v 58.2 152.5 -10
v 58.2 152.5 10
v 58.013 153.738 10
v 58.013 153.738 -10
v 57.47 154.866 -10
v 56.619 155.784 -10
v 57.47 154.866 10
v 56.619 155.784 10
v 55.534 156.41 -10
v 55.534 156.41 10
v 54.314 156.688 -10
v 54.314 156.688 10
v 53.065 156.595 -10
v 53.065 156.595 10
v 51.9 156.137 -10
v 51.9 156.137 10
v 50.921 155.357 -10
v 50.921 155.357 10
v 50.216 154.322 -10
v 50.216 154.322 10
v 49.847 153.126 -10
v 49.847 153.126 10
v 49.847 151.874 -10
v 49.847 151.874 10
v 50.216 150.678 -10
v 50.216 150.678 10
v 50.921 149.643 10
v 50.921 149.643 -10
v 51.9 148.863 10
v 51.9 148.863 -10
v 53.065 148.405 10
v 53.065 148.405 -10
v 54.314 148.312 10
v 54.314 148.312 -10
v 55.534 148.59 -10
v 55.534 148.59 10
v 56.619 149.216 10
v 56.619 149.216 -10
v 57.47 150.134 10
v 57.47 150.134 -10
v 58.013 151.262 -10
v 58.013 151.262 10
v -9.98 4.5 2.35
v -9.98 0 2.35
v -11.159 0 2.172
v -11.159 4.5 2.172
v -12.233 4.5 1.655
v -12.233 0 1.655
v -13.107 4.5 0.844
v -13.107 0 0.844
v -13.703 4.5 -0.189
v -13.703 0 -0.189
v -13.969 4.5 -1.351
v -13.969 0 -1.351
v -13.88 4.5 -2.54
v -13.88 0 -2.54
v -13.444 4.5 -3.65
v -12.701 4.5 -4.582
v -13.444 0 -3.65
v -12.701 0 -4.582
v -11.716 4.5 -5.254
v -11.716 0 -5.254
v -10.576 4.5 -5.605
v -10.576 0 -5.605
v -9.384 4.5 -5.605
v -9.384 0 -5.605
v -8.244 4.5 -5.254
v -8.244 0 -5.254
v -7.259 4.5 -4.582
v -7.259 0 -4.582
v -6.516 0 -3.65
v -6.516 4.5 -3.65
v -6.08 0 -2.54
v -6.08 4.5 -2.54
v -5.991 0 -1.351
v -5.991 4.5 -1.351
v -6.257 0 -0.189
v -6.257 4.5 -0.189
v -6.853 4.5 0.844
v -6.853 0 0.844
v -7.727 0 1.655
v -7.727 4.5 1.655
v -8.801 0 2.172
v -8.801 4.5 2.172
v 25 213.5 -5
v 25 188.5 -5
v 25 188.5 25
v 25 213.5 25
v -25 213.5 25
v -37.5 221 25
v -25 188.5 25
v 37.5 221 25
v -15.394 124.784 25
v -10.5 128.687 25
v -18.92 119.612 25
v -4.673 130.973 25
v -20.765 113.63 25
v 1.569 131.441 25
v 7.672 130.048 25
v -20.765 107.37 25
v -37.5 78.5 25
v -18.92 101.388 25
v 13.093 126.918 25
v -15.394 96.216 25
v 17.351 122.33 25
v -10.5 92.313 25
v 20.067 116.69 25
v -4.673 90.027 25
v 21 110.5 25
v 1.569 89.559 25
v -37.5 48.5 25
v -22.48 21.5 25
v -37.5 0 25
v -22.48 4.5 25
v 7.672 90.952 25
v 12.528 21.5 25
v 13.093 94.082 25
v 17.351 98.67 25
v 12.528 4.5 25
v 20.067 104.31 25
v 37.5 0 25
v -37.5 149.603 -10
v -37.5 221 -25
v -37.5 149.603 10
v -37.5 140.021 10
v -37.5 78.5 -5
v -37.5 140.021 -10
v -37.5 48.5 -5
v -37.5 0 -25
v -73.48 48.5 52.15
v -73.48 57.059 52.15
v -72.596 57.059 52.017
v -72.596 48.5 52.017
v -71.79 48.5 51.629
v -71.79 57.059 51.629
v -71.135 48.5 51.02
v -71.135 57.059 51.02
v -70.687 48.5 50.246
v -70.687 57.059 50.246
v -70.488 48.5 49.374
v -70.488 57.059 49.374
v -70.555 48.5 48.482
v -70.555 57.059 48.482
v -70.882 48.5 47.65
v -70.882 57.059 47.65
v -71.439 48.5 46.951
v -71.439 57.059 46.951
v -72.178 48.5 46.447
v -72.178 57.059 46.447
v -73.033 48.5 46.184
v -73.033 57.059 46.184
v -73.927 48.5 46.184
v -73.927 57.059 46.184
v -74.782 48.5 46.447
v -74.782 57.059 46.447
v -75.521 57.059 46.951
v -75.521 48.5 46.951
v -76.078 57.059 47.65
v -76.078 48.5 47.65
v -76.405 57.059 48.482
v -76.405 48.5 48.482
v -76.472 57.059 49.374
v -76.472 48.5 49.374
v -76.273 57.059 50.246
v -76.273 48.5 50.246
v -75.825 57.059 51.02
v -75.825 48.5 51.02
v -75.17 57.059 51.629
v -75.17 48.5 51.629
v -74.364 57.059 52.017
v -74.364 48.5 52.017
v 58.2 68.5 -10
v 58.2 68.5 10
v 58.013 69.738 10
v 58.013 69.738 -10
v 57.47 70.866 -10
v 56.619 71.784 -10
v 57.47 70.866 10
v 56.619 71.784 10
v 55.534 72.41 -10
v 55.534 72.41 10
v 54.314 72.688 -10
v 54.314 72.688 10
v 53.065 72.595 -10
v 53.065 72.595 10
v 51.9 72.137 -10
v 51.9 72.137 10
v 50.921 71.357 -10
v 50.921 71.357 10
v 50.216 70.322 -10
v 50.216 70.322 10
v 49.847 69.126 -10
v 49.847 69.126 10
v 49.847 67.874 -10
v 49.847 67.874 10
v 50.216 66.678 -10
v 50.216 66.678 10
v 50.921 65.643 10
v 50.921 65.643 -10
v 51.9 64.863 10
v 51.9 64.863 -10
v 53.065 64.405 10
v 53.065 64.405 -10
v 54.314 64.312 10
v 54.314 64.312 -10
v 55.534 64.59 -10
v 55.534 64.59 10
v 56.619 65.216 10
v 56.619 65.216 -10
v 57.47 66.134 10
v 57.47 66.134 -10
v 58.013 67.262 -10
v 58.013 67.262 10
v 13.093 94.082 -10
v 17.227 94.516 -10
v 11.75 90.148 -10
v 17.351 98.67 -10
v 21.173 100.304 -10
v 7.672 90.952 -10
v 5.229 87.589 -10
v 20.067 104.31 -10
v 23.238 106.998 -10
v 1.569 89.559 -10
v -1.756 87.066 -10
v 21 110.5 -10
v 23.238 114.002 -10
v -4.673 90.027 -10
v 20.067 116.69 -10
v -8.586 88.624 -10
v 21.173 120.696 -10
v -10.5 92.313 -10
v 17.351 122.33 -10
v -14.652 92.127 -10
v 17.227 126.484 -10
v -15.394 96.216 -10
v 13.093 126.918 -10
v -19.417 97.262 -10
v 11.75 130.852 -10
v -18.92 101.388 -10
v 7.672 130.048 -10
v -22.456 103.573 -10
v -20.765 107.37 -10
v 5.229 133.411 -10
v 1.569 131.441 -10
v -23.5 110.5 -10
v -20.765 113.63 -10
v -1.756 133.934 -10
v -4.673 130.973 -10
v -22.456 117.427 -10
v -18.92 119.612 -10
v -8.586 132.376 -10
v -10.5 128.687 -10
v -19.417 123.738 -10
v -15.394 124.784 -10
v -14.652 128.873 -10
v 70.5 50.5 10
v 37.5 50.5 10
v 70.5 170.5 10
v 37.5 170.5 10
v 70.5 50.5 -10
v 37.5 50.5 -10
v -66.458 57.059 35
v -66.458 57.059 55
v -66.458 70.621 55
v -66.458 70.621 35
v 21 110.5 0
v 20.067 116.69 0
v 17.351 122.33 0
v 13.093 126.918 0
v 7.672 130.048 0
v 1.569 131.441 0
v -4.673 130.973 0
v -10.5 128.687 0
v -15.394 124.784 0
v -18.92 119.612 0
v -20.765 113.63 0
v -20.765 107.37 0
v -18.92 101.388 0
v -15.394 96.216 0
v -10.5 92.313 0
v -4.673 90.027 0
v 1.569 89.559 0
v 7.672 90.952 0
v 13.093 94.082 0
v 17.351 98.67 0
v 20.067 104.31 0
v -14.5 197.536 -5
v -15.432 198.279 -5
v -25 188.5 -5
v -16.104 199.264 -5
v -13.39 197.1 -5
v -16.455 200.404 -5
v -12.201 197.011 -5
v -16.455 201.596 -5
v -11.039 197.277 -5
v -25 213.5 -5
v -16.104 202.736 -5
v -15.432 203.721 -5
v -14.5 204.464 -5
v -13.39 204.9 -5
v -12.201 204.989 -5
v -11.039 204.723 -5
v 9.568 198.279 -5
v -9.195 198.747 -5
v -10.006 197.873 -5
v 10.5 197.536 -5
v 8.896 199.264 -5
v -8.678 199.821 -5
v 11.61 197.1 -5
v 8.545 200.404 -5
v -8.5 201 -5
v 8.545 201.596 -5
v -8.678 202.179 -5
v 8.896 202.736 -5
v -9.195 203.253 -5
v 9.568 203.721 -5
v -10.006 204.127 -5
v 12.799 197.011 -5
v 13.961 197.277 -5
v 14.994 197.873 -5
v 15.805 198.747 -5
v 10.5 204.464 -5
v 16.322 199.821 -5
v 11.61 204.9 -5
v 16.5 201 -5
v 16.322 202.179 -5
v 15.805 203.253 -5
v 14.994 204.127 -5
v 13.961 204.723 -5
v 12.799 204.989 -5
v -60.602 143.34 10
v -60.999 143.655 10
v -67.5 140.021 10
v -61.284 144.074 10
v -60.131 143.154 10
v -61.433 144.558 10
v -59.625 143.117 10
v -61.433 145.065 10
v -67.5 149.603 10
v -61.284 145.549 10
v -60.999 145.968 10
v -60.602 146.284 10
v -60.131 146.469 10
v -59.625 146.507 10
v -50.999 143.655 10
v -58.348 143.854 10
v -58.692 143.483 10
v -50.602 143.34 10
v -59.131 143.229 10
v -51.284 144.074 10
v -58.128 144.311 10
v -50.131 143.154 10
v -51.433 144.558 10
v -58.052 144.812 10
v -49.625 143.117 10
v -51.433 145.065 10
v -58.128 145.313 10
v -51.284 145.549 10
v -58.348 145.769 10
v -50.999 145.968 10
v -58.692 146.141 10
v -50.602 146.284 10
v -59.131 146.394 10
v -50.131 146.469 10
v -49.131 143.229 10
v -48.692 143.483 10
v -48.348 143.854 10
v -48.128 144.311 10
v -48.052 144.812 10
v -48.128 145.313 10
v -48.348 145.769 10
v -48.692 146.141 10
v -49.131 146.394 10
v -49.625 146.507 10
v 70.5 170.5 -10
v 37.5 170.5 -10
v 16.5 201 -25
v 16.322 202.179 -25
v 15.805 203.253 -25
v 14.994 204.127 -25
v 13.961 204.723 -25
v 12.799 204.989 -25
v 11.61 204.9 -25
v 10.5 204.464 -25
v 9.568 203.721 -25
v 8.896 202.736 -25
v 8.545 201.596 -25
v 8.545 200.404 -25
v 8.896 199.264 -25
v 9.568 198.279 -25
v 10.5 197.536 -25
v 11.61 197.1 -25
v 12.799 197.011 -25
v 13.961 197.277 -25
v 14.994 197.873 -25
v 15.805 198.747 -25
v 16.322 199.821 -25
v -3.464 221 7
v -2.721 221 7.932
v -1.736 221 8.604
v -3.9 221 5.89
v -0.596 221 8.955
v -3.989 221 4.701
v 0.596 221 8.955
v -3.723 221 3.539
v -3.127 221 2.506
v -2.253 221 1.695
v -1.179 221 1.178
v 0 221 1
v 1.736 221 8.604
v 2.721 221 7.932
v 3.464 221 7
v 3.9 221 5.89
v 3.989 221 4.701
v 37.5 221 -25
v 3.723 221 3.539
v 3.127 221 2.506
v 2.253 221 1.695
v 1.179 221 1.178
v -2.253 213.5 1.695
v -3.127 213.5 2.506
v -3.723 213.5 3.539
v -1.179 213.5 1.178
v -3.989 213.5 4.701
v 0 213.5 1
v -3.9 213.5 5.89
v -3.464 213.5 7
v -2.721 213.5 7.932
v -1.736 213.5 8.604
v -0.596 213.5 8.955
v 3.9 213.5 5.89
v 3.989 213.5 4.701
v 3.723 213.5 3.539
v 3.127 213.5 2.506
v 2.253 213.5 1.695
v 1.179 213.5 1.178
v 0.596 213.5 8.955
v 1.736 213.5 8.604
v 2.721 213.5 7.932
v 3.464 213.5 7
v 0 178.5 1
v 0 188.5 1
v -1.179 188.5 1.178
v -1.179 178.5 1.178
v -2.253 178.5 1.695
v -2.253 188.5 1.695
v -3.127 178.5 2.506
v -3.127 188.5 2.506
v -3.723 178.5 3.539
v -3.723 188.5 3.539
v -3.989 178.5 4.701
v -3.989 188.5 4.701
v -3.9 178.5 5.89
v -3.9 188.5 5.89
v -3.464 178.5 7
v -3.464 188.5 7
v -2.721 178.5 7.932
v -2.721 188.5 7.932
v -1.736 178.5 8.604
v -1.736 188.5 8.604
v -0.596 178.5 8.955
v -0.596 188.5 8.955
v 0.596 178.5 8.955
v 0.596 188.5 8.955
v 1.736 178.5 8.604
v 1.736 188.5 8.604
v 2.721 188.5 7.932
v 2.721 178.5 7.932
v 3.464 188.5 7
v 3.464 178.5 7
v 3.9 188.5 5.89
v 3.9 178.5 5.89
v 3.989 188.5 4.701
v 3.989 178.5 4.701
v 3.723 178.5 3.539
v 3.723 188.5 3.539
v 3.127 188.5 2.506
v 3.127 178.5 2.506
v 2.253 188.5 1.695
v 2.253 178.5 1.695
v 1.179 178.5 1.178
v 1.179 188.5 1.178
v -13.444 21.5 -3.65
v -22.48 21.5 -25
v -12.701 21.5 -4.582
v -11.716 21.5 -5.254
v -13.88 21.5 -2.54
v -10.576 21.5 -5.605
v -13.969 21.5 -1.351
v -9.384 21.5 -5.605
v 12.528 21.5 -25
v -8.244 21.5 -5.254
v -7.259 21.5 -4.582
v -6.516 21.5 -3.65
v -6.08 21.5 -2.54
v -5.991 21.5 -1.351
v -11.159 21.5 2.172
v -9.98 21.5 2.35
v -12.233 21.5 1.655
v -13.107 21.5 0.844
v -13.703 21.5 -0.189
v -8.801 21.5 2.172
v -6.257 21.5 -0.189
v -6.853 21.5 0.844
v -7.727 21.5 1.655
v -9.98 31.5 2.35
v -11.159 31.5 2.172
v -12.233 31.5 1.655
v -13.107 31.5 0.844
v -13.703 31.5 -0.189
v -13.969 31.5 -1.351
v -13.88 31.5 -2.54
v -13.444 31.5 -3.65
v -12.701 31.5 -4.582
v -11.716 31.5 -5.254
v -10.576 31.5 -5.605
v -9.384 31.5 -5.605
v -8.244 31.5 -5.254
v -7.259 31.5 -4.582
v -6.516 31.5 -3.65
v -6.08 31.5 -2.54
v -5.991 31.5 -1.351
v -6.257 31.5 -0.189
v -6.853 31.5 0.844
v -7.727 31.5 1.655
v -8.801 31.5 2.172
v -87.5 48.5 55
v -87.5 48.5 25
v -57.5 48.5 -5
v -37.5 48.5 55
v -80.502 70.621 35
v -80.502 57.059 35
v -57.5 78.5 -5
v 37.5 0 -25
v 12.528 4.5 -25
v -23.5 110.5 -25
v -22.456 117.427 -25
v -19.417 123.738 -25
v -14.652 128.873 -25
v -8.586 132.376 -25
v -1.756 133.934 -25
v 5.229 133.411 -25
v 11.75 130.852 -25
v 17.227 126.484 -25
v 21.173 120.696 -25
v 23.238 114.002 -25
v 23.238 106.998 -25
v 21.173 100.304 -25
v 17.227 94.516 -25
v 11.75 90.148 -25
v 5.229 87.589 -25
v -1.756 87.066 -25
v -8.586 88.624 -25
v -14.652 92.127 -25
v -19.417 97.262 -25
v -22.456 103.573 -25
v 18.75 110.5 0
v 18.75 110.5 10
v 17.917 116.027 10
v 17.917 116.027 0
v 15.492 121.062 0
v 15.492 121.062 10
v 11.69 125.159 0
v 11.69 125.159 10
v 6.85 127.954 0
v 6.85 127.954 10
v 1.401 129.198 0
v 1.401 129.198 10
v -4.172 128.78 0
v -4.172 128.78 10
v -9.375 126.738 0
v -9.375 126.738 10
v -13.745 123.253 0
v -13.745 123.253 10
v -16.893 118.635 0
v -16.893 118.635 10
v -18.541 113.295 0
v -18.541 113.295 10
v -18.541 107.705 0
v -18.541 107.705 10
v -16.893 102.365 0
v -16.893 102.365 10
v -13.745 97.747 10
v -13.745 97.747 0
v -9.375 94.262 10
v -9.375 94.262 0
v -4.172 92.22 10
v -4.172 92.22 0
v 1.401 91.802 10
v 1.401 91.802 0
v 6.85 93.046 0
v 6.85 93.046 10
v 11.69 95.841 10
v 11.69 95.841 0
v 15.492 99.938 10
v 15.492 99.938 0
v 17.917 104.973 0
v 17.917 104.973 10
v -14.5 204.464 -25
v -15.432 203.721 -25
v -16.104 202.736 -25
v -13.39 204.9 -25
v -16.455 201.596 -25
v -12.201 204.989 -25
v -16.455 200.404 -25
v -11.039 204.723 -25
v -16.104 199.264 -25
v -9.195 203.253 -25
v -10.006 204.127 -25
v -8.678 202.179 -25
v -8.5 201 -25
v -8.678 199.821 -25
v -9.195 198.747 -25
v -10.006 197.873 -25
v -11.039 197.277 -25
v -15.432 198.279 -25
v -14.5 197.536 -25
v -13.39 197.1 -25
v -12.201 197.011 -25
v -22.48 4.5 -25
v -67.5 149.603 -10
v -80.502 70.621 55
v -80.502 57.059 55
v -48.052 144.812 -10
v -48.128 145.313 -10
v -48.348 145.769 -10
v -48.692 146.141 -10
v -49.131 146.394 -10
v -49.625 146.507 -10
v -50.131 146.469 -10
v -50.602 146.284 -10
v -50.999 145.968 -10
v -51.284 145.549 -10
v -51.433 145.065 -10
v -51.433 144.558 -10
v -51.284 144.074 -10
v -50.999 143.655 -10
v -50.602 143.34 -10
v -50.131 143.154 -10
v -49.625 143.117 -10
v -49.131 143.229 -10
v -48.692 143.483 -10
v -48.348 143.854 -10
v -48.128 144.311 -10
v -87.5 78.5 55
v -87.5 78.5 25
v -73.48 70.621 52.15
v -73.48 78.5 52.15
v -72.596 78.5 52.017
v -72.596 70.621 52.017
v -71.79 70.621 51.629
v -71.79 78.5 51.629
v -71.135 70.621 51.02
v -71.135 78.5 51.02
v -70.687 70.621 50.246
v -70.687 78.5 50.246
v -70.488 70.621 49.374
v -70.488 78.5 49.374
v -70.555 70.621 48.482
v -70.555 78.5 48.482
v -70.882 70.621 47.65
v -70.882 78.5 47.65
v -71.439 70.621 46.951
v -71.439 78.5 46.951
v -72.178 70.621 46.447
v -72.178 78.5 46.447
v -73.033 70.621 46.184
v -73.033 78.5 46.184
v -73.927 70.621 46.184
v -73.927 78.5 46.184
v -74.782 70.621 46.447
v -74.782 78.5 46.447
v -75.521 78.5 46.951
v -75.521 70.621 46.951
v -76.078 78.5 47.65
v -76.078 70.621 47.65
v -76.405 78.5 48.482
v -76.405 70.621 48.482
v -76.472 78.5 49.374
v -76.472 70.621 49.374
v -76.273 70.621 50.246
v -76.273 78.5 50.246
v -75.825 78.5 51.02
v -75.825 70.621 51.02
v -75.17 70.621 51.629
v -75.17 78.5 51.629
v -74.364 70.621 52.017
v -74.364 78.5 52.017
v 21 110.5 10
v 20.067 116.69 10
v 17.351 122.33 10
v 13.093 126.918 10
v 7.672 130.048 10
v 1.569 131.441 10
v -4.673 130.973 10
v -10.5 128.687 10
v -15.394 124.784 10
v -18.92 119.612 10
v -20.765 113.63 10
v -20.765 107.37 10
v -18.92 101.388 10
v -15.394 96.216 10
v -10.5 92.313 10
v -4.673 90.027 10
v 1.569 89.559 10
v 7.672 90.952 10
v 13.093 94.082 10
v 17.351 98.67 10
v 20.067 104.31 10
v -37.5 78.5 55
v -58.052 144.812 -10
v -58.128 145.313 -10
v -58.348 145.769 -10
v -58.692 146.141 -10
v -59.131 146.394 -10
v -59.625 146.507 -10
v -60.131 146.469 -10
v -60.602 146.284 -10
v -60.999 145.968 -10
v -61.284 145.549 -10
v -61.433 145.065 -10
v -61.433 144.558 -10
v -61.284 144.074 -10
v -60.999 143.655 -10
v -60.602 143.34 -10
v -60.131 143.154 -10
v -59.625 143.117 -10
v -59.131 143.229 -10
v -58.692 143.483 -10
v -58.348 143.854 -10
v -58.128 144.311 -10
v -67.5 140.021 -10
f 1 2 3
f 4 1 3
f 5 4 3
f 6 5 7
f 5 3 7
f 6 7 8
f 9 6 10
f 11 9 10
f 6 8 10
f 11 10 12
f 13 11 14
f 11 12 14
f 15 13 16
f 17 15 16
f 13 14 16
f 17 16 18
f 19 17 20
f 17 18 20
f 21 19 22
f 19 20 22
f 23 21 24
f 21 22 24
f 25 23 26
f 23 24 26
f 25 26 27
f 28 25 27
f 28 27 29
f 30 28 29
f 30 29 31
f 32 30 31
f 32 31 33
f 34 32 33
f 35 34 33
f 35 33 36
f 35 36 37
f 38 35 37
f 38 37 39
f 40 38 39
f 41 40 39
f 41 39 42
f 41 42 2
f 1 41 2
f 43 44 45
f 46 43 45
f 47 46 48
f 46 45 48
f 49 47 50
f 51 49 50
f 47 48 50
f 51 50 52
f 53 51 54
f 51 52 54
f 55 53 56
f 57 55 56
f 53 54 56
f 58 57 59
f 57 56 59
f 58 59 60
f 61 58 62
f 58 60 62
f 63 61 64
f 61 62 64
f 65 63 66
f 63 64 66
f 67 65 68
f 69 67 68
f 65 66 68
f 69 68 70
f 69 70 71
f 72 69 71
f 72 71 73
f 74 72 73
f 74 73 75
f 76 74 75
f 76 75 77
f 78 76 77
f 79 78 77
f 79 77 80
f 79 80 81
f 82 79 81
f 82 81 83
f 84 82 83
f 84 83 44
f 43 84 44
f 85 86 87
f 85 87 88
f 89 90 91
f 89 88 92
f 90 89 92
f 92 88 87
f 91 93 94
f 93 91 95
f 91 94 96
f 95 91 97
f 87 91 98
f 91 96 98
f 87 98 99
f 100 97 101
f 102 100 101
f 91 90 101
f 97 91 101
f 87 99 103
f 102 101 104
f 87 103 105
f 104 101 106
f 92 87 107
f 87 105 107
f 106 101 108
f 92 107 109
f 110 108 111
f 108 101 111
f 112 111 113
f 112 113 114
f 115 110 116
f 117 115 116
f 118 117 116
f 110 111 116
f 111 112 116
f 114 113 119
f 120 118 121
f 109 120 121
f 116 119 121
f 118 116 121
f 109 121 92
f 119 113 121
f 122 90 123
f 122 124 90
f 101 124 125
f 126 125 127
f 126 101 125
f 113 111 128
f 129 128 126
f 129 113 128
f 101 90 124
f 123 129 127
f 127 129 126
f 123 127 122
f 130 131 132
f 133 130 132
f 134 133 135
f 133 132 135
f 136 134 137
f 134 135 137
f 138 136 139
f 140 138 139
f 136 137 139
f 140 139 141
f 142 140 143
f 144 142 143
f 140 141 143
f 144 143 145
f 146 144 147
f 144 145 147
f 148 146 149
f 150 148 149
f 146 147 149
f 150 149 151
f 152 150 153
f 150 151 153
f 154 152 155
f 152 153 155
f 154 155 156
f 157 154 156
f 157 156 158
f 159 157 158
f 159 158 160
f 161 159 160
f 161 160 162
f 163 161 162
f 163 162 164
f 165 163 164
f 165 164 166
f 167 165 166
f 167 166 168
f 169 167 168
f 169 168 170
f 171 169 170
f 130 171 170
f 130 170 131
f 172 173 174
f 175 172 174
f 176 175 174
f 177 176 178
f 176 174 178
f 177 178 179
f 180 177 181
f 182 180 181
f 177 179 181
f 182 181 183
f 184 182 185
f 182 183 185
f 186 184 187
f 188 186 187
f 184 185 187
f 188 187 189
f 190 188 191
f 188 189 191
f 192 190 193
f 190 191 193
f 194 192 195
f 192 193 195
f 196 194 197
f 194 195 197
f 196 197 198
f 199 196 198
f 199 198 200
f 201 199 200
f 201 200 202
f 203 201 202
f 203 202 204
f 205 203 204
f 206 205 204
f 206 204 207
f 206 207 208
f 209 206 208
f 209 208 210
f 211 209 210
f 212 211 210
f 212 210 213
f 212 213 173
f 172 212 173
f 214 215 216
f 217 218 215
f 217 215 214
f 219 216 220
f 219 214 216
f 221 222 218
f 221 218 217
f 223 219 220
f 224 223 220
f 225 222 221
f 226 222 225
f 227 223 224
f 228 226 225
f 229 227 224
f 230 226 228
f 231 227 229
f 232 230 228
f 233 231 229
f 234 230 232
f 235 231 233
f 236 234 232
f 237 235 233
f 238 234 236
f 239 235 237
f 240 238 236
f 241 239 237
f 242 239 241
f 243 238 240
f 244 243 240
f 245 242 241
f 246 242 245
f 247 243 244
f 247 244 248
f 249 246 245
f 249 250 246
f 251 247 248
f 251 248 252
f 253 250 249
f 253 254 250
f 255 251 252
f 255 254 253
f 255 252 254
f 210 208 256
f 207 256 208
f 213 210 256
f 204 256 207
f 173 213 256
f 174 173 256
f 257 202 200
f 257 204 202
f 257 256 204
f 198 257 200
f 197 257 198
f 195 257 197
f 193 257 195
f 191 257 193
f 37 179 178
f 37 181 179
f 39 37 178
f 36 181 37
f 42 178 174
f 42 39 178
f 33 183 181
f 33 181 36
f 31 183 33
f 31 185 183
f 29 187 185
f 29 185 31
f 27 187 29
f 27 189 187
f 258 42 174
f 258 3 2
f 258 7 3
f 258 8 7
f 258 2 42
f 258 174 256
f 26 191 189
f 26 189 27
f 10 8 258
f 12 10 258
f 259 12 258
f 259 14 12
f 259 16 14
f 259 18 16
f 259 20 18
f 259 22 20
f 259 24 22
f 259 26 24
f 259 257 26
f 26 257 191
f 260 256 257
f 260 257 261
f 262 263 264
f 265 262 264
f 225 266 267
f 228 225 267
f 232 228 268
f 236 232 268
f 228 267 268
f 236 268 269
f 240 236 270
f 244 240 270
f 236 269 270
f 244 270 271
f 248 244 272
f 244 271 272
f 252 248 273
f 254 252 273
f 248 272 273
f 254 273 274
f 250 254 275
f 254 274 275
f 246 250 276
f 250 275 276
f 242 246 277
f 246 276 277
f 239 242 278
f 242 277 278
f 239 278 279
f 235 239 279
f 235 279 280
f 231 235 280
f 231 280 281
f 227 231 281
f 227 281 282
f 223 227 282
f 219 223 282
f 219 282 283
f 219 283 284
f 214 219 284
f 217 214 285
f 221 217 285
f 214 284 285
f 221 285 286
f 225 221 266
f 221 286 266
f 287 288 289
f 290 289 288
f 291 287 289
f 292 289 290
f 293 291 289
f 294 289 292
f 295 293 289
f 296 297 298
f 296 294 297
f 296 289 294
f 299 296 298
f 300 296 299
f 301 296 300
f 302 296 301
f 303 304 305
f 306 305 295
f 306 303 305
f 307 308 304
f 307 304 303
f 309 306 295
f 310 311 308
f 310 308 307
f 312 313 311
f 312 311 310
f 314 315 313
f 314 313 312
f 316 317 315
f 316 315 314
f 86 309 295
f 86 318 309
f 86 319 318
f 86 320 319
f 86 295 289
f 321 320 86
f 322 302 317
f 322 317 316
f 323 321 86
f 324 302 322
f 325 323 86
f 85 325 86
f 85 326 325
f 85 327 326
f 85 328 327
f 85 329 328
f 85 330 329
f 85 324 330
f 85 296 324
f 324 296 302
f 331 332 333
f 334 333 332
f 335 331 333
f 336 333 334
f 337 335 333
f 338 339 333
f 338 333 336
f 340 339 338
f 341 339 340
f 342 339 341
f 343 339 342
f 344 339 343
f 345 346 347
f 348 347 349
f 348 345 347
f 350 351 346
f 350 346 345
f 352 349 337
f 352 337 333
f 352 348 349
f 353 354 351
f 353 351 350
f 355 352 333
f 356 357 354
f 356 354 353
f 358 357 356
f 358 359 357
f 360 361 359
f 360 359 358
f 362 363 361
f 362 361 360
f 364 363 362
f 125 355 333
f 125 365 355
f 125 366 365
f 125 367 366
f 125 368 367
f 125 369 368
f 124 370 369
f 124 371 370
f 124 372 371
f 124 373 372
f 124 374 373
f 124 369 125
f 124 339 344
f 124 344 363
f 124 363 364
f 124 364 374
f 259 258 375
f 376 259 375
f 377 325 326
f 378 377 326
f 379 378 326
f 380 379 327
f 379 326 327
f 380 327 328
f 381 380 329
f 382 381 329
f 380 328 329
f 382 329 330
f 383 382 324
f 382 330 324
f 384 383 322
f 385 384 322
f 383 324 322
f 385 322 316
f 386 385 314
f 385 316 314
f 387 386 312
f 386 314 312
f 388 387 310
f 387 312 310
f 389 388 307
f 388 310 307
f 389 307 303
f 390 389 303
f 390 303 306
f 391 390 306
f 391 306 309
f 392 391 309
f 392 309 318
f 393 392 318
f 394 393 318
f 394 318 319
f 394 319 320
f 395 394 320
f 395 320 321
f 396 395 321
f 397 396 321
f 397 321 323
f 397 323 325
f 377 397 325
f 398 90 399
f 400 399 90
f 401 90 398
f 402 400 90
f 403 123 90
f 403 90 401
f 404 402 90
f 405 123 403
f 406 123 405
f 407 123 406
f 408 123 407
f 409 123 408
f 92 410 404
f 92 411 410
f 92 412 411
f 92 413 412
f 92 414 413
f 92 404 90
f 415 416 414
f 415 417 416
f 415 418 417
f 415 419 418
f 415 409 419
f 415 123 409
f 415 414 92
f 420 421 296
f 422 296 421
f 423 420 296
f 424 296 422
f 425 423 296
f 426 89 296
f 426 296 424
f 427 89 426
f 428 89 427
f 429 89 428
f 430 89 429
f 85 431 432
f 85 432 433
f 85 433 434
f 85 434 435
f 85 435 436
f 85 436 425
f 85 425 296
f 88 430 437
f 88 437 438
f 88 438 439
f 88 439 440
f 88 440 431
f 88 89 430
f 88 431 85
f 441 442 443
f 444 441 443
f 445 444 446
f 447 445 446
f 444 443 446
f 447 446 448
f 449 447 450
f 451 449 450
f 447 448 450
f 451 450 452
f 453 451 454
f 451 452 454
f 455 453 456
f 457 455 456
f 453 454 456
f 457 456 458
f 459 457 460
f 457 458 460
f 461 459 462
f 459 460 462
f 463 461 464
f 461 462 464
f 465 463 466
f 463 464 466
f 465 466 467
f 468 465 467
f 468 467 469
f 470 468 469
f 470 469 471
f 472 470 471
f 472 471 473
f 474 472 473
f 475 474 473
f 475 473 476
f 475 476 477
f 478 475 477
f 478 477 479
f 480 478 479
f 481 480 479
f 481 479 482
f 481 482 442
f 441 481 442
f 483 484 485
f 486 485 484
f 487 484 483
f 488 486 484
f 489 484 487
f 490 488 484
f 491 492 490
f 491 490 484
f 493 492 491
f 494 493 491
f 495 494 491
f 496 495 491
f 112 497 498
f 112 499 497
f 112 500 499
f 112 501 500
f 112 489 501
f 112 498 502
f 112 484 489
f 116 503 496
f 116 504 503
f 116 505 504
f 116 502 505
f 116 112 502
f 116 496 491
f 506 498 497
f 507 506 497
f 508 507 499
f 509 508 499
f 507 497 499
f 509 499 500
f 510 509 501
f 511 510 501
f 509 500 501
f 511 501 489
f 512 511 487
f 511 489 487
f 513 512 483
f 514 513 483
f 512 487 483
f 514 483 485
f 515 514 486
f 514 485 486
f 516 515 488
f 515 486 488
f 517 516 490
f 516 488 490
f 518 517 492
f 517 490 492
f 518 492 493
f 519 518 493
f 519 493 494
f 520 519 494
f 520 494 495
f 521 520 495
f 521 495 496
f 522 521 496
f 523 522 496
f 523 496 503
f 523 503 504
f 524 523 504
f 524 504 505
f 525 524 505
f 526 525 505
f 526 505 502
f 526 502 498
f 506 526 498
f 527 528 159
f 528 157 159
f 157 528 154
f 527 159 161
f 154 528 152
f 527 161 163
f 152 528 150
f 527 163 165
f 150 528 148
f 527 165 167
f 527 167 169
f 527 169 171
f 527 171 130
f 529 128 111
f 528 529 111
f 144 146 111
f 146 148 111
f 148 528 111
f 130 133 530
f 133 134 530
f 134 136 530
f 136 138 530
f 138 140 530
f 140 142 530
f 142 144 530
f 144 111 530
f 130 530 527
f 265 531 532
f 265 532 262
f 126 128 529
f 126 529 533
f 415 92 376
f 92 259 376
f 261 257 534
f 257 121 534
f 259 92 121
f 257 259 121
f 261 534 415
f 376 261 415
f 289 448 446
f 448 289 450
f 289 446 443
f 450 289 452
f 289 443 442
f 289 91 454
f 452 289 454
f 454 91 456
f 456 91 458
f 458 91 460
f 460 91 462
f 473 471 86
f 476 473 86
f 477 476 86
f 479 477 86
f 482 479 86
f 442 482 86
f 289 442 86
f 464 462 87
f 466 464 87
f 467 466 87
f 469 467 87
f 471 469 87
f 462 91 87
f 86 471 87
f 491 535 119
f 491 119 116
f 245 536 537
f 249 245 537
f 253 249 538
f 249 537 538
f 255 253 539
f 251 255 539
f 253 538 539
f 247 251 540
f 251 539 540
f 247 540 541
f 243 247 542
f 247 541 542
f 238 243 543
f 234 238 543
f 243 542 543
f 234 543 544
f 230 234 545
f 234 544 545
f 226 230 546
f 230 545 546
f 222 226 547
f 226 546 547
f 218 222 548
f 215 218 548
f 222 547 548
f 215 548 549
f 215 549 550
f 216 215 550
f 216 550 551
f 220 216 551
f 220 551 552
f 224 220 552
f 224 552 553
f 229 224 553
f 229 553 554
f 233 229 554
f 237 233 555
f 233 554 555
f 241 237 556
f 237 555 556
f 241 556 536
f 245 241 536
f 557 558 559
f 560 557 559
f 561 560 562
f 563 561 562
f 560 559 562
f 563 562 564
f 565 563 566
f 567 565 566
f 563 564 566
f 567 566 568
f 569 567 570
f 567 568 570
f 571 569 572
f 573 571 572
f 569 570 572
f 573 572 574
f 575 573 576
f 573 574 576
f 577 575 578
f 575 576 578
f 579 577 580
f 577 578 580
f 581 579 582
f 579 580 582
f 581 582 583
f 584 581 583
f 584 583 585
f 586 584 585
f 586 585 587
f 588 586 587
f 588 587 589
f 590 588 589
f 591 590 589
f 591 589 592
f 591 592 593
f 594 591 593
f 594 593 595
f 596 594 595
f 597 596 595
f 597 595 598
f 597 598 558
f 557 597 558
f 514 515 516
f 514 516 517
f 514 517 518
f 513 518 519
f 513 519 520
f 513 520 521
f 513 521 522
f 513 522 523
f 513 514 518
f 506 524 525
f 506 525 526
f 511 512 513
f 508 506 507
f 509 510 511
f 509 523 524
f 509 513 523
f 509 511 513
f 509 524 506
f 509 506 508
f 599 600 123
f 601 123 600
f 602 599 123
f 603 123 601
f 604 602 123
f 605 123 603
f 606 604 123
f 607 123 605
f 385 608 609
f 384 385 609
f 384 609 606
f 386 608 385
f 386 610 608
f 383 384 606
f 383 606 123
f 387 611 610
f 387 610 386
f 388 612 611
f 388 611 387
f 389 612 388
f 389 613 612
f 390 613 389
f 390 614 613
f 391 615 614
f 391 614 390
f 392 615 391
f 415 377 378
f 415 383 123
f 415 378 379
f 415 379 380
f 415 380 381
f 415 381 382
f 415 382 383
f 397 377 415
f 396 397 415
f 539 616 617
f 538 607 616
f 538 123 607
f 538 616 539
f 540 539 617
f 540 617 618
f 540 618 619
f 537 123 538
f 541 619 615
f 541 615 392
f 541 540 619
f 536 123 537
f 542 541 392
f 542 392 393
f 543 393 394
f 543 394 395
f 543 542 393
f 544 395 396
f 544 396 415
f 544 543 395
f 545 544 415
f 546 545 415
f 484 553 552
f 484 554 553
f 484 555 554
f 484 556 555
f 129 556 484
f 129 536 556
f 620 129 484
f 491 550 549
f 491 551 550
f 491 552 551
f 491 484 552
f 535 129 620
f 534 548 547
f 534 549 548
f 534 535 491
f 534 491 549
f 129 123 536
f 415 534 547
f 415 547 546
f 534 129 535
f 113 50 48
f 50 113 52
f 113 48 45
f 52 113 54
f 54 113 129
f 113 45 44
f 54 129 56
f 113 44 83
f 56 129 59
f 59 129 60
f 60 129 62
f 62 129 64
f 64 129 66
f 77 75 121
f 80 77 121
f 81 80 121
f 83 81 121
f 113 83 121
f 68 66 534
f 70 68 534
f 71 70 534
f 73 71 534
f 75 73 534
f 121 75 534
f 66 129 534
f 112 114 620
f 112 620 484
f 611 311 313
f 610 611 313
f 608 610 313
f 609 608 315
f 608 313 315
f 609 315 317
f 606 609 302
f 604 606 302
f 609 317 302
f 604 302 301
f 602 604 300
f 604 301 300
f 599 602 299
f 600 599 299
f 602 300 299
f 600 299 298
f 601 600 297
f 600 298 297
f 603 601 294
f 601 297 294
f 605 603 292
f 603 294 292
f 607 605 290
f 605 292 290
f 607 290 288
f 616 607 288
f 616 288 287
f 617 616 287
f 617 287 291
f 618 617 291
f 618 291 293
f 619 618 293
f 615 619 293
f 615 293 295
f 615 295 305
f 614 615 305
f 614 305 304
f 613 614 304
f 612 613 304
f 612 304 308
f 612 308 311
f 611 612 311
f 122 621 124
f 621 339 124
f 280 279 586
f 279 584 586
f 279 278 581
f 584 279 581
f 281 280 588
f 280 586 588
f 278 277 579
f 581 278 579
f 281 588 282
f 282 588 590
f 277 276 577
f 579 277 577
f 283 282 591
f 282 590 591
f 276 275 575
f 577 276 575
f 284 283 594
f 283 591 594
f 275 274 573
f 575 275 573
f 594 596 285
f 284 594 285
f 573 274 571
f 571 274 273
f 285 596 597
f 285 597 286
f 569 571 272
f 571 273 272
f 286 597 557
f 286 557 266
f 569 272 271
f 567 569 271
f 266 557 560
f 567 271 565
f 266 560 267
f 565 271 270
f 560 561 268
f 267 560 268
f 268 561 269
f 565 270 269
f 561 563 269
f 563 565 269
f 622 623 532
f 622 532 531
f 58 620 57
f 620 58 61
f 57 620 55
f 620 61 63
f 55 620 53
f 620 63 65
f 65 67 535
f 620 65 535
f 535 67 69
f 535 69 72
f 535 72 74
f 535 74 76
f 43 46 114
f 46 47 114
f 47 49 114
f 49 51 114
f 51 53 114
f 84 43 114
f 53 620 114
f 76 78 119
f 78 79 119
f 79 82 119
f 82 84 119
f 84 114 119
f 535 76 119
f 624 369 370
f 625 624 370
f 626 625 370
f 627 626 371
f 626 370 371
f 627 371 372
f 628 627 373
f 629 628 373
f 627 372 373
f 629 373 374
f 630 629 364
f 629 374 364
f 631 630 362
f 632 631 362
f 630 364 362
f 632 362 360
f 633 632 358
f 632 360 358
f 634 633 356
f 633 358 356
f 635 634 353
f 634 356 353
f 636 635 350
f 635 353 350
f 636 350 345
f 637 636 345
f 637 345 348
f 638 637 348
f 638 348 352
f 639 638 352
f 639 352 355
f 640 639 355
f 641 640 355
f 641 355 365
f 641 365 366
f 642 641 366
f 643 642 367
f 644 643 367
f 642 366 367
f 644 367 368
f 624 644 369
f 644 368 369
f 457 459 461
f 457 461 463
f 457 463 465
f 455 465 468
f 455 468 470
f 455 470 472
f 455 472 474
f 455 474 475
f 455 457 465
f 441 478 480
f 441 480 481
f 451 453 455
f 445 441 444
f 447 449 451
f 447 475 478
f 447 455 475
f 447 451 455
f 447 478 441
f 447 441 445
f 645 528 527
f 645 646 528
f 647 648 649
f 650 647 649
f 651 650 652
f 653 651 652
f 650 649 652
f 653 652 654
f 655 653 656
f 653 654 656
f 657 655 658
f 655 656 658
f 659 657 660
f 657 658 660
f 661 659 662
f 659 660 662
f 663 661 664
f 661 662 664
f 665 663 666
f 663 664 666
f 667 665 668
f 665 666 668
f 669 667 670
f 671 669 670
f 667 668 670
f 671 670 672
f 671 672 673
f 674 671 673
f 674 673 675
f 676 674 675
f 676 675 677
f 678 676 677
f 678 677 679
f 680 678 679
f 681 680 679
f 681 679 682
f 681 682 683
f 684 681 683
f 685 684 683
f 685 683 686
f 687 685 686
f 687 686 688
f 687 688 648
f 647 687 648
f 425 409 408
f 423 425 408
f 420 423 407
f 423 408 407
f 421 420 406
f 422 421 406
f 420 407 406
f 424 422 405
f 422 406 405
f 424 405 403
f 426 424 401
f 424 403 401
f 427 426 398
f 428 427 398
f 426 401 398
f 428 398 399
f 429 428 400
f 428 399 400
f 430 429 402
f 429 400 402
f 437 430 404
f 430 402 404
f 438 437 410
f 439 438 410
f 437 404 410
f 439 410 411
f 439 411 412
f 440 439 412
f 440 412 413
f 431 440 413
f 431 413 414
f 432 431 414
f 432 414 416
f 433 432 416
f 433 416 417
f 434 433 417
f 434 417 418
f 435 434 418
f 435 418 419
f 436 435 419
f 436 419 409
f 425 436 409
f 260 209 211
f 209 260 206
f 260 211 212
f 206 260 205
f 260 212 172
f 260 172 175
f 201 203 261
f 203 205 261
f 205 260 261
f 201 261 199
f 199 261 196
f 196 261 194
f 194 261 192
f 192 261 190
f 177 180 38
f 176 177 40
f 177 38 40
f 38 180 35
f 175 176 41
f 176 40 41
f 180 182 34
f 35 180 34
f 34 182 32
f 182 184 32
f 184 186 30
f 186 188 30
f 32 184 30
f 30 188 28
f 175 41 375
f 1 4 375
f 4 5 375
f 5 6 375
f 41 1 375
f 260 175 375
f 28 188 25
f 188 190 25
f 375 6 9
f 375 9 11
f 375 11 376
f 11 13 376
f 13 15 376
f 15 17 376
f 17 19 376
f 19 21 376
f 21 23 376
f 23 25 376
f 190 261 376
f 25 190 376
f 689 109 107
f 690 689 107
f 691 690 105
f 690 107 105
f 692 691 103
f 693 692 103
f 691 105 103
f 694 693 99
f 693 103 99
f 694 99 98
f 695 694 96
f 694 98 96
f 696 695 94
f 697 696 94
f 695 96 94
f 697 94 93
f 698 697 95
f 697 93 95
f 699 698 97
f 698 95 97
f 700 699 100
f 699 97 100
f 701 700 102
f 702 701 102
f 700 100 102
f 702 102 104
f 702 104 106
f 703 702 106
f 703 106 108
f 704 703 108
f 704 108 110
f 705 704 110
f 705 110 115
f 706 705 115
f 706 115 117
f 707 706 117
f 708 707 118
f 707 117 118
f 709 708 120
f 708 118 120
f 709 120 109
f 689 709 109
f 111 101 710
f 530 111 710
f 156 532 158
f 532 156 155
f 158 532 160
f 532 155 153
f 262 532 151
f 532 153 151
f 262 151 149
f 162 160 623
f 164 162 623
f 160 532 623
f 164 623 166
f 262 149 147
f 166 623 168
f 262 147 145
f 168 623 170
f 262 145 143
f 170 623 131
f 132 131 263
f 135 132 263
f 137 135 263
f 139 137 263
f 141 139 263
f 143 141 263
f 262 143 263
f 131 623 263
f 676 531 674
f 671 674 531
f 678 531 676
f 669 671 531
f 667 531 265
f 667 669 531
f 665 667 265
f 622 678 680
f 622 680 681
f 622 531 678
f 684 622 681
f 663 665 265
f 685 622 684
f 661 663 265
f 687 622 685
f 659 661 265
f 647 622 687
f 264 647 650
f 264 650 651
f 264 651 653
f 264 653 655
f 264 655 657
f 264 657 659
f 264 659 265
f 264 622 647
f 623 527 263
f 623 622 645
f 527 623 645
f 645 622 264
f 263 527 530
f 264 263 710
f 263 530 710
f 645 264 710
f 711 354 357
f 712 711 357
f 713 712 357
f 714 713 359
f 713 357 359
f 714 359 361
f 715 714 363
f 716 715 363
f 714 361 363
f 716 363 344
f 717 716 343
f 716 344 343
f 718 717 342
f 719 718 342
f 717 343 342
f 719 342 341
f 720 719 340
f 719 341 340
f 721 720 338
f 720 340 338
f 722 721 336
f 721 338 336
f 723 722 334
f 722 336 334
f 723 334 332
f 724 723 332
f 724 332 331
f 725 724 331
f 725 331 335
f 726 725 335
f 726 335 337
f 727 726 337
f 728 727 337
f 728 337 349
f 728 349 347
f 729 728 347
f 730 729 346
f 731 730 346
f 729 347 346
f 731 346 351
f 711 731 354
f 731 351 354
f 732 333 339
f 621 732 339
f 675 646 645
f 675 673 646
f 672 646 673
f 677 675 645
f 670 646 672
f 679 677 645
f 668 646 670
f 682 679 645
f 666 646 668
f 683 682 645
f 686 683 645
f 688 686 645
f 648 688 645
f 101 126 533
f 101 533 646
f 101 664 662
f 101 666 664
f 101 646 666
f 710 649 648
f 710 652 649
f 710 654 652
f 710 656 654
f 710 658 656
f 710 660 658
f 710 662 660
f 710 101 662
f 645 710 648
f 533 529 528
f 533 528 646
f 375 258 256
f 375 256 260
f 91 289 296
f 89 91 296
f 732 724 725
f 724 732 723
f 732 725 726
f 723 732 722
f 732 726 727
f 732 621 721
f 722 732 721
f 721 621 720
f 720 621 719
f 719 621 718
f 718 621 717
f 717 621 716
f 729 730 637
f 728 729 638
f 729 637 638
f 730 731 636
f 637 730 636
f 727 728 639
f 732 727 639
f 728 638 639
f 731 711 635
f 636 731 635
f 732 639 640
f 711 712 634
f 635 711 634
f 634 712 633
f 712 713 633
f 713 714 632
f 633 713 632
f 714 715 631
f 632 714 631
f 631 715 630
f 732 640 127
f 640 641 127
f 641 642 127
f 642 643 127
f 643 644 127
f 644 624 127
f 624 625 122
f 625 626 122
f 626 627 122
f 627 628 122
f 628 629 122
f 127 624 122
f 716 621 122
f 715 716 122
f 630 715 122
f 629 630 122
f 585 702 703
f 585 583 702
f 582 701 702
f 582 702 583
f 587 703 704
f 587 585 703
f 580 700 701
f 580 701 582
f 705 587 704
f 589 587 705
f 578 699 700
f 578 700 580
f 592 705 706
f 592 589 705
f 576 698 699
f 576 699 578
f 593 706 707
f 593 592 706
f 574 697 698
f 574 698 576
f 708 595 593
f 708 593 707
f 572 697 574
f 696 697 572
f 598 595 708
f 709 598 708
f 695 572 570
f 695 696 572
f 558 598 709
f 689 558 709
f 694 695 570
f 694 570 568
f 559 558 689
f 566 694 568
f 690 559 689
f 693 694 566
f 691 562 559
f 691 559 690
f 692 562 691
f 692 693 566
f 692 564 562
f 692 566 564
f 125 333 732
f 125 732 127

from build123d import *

# Parameters (mm, degrees)
SKETCH1_W                         = 75
SKETCH1_H                         = 50
BE_MAIN_UPRIGHT_BODY_DEPTH        = 221
SKETCH4_R                         = 18.75
CE_THROUGH_HOLE_DEPTH             = 230.667694724
SKETCH2_R                         = 21
CE_INNER_BEARING_DEPTH            = 15
SKETCH3_R                         = 23.5
CE_OUTER_BEARING_DEPTH            = 15
SKETCH7_W                         = 20
SKETCH7_H                         = 120
BE_CALIPER_MOUNT_DEPTH            = 33
SKETCH21_W                        = 30
SKETCH21_H                        = 9.582052631
BE_TEMP_SENSOR_MOUNT_V2_DEPTH     = 10
SKETCH9_W                         = 60
SKETCH9_H                         = 30
BE_TIE_ROD_MOUNT_DEPTH            = 50
SKETCH10_R                        = 4.2
CE_CALIPER_HOLES_DEPTH            = 242.91372429
SKETCH12_R                        = 4
CE_TOP_CLEVIS_HOLES_DEPTH         = 243.893495178
SKETCH33_W                        = 50
SKETCH33_H                        = 25
CE_SIMPLE_TOP_CLEVIS_SPACE_DEPTH  = 30
SKETCH34_R                        = 4
CUT_EXTRUDE12_DEPTH               = 42.5
SKETCH14_W                        = 25
SKETCH14_H                        = 12
CE_BOTTOM_CLEVIS_SPACE_DEPTH      = 243.893495178
SKETCH15_W                        = 25
SKETCH15_H                        = 5
CE_EXPAND_BOTTOM_CLEVIS_DEPTH     = 243.893495178
CE_WIDEN_BOTTOM_CLEVIS_DEPTH      = 240.74121548
CE_WIDEN_BOTTOM_CLEVIS_DEPTH_BACK = 240.74121548
SKETCH16_W                        = 10.007554032
SKETCH16_H                        = 17
CHAMFER1_SIZE                     = 30
SKETCH18_W                        = 14.04398123
SKETCH18_H                        = 13.562779604
CUT_EXTRUDE1_DEPTH                = 20
SKETCH19_R                        = 3
CUT_EXTRUDE2_DEPTH                = 177.032667423
SKETCH22_R                        = 1.7
CUT_EXTRUDE4_DEPTH                = 20
SKETCH31_R                        = 4
CUT_EXTRUDE9_DEPTH                = 31.5
SKETCH35_R                        = 21
CUT_EXTRUDE13_DEPTH               = 10


with BuildPart() as part:
    # Sketch1 → BE - main upright body (new body)
    with BuildSketch(Plane(origin=(0, 0, 0), x_dir=(1, 0, 0), z_dir=(0, 1, 0))):
        Rectangle(SKETCH1_W, SKETCH1_H)
    extrude(amount=BE_MAIN_UPRIGHT_BODY_DEPTH)

    # Sketch4 → CE - Through hole (cut, through all)
    with BuildSketch(Plane.XY.offset(25)):
        with Locations((0, 110.5)):
            Circle(SKETCH4_R)
    extrude(amount=-CE_THROUGH_HOLE_DEPTH, mode=Mode.SUBTRACT)

    # Sketch2 → CE - Inner bearing (cut)
    with BuildSketch(Plane.XY.offset(25)):
        with Locations((0, 110.5)):
            Circle(SKETCH2_R)
    extrude(amount=-CE_INNER_BEARING_DEPTH, mode=Mode.SUBTRACT)

    # Sketch3 → CE - Outer bearing (cut)
    with BuildSketch(Plane(origin=(0, 0, -25), x_dir=(-1, 0, 0), z_dir=(0, 0, -1))):
        with Locations((0, 110.5)):
            Circle(SKETCH3_R)
    extrude(amount=-CE_OUTER_BEARING_DEPTH, mode=Mode.SUBTRACT)

    # Sketch7 → BE - caliper mount (add)
    with BuildSketch(Plane(origin=(37.5, 0, 0), x_dir=(0, 0, -1), z_dir=(1, 0, 0))):
        with Locations((0, 110.5)):
            Rectangle(SKETCH7_W, SKETCH7_H)
    extrude(amount=BE_CALIPER_MOUNT_DEPTH)

    # Sketch21 → BE - temp sensor mount v2 (add, symmetric)
    with BuildSketch(Plane.XY):
        with Locations((-52.5, 144.811784304)):
            Rectangle(SKETCH21_W, SKETCH21_H)
    extrude(amount=BE_TEMP_SENSOR_MOUNT_V2_DEPTH, both=True)

    # Sketch9 → BE - tie rod mount (add)
    with BuildSketch(Plane.ZY.offset(37.5)):
        with Locations((25, 63.5)):
            Rectangle(SKETCH9_W, SKETCH9_H)
    extrude(amount=BE_TIE_ROD_MOUNT_DEPTH)

    # Sketch10 → CE - caliper holes (cut, through all)
    with BuildSketch(Plane.XY.offset(10)):
        with Locations((54, 152.5)):
            Circle(SKETCH10_R)
        with Locations((54, 68.5)):
            Circle(SKETCH10_R)
    extrude(amount=-CE_CALIPER_HOLES_DEPTH, mode=Mode.SUBTRACT)

    # Sketch12 → CE - top clevis holes (cut, through all)
    with BuildSketch(Plane.XY.offset(25)):
        with Locations((-12.5, 201)):
            Circle(SKETCH12_R)
        with Locations((12.5, 201)):
            Circle(SKETCH12_R)
    extrude(amount=-CE_TOP_CLEVIS_HOLES_DEPTH, mode=Mode.SUBTRACT)

    # Sketch33 → CE - simple top clevis space (cut)
    with BuildSketch(Plane.XY.offset(25)):
        with Locations((0, 201)):
            Rectangle(SKETCH33_W, SKETCH33_H)
    extrude(amount=-CE_SIMPLE_TOP_CLEVIS_SPACE_DEPTH, mode=Mode.SUBTRACT)

    # Sketch34 → Cut-Extrude12 (cut)
    with BuildSketch(Plane(origin=(0, 221, 0), x_dir=(1, 0, 0), z_dir=(0, 1, 0))):
        with Locations(Location((0, -5, 0), (0, 0, 90))):
            Circle(SKETCH34_R)
    extrude(amount=-CUT_EXTRUDE12_DEPTH, mode=Mode.SUBTRACT)

    # Sketch14 → CE - bottom clevis space (cut, through all)
    with BuildSketch(Plane.XY.offset(25)):
        with Locations((-9.98, 10.5)):
            Rectangle(SKETCH14_W, SKETCH14_H)
    extrude(amount=-CE_BOTTOM_CLEVIS_SPACE_DEPTH, mode=Mode.SUBTRACT)

    # Sketch15 → CE - expand bottom clevis (cut, through all)
    with BuildSketch(Plane.XY.offset(25)):
        with Locations((-9.98, 19)):
            Rectangle(SKETCH15_W, SKETCH15_H)
    extrude(amount=-CE_EXPAND_BOTTOM_CLEVIS_DEPTH, mode=Mode.SUBTRACT)

    # Sketch16 → CE - widen bottom clevis (cut, two sides: drawn at the far end of the back side and taken through both)
    with BuildSketch(Plane(origin=(2.52, 4.5, 25), x_dir=(1, 0, 0), z_dir=(0, 0, 1)).offset(-CE_WIDEN_BOTTOM_CLEVIS_DEPTH_BACK)):
        with Locations((5.003777016, 8.5)):
            Rectangle(SKETCH16_W, SKETCH16_H)
    extrude(amount=CE_WIDEN_BOTTOM_CLEVIS_DEPTH + CE_WIDEN_BOTTOM_CLEVIS_DEPTH_BACK, mode=Mode.SUBTRACT)

    # Chamfer1
    chamfer1_edges = [part.edges().sort_by_distance(p)[0] for p in [
        (-87.5, 63.5, -5),
    ]]
    chamfer(chamfer1_edges, length=CHAMFER1_SIZE)

    # Sketch18 → Cut-Extrude1 (cut)
    with BuildSketch(Plane.XY.offset(55)):
        with Locations((-73.48, 63.84)):
            Rectangle(SKETCH18_W, SKETCH18_H)
    extrude(amount=-CUT_EXTRUDE1_DEPTH, mode=Mode.SUBTRACT)

    # Sketch19 → Cut-Extrude2 (cut, through all)
    with BuildSketch(Plane(origin=(0, 78.5, 0), x_dir=(1, 0, 0), z_dir=(0, 1, 0))):
        with Locations(Location((-73.48, -49.15, 0), (0, 0, 270))):
            Circle(SKETCH19_R)
    extrude(amount=-CUT_EXTRUDE2_DEPTH, mode=Mode.SUBTRACT)

    # Sketch22 → Cut-Extrude4 (cut)
    with BuildSketch(Plane.XY.offset(10)):
        with Locations((-59.752411208, 144.811784303)):
            Circle(SKETCH22_R)
        with Locations((-49.752411208, 144.811784303)):
            Circle(SKETCH22_R)
    extrude(amount=-CUT_EXTRUDE4_DEPTH, mode=Mode.SUBTRACT)

    # Sketch31 → Cut-Extrude9 (cut)
    with BuildSketch(Plane.XZ):
        with Locations(Location((-9.98, -1.65, 0), (0, 0, 90))):
            Circle(SKETCH31_R)
    extrude(amount=-CUT_EXTRUDE9_DEPTH, mode=Mode.SUBTRACT)

    # Sketch35 → Cut-Extrude13 (cut)
    with BuildSketch(Plane.XY):
        with Locations((0, 110.5)):
            Circle(SKETCH35_R)
    extrude(amount=-CUT_EXTRUDE13_DEPTH, mode=Mode.SUBTRACT)


solid = part.part
